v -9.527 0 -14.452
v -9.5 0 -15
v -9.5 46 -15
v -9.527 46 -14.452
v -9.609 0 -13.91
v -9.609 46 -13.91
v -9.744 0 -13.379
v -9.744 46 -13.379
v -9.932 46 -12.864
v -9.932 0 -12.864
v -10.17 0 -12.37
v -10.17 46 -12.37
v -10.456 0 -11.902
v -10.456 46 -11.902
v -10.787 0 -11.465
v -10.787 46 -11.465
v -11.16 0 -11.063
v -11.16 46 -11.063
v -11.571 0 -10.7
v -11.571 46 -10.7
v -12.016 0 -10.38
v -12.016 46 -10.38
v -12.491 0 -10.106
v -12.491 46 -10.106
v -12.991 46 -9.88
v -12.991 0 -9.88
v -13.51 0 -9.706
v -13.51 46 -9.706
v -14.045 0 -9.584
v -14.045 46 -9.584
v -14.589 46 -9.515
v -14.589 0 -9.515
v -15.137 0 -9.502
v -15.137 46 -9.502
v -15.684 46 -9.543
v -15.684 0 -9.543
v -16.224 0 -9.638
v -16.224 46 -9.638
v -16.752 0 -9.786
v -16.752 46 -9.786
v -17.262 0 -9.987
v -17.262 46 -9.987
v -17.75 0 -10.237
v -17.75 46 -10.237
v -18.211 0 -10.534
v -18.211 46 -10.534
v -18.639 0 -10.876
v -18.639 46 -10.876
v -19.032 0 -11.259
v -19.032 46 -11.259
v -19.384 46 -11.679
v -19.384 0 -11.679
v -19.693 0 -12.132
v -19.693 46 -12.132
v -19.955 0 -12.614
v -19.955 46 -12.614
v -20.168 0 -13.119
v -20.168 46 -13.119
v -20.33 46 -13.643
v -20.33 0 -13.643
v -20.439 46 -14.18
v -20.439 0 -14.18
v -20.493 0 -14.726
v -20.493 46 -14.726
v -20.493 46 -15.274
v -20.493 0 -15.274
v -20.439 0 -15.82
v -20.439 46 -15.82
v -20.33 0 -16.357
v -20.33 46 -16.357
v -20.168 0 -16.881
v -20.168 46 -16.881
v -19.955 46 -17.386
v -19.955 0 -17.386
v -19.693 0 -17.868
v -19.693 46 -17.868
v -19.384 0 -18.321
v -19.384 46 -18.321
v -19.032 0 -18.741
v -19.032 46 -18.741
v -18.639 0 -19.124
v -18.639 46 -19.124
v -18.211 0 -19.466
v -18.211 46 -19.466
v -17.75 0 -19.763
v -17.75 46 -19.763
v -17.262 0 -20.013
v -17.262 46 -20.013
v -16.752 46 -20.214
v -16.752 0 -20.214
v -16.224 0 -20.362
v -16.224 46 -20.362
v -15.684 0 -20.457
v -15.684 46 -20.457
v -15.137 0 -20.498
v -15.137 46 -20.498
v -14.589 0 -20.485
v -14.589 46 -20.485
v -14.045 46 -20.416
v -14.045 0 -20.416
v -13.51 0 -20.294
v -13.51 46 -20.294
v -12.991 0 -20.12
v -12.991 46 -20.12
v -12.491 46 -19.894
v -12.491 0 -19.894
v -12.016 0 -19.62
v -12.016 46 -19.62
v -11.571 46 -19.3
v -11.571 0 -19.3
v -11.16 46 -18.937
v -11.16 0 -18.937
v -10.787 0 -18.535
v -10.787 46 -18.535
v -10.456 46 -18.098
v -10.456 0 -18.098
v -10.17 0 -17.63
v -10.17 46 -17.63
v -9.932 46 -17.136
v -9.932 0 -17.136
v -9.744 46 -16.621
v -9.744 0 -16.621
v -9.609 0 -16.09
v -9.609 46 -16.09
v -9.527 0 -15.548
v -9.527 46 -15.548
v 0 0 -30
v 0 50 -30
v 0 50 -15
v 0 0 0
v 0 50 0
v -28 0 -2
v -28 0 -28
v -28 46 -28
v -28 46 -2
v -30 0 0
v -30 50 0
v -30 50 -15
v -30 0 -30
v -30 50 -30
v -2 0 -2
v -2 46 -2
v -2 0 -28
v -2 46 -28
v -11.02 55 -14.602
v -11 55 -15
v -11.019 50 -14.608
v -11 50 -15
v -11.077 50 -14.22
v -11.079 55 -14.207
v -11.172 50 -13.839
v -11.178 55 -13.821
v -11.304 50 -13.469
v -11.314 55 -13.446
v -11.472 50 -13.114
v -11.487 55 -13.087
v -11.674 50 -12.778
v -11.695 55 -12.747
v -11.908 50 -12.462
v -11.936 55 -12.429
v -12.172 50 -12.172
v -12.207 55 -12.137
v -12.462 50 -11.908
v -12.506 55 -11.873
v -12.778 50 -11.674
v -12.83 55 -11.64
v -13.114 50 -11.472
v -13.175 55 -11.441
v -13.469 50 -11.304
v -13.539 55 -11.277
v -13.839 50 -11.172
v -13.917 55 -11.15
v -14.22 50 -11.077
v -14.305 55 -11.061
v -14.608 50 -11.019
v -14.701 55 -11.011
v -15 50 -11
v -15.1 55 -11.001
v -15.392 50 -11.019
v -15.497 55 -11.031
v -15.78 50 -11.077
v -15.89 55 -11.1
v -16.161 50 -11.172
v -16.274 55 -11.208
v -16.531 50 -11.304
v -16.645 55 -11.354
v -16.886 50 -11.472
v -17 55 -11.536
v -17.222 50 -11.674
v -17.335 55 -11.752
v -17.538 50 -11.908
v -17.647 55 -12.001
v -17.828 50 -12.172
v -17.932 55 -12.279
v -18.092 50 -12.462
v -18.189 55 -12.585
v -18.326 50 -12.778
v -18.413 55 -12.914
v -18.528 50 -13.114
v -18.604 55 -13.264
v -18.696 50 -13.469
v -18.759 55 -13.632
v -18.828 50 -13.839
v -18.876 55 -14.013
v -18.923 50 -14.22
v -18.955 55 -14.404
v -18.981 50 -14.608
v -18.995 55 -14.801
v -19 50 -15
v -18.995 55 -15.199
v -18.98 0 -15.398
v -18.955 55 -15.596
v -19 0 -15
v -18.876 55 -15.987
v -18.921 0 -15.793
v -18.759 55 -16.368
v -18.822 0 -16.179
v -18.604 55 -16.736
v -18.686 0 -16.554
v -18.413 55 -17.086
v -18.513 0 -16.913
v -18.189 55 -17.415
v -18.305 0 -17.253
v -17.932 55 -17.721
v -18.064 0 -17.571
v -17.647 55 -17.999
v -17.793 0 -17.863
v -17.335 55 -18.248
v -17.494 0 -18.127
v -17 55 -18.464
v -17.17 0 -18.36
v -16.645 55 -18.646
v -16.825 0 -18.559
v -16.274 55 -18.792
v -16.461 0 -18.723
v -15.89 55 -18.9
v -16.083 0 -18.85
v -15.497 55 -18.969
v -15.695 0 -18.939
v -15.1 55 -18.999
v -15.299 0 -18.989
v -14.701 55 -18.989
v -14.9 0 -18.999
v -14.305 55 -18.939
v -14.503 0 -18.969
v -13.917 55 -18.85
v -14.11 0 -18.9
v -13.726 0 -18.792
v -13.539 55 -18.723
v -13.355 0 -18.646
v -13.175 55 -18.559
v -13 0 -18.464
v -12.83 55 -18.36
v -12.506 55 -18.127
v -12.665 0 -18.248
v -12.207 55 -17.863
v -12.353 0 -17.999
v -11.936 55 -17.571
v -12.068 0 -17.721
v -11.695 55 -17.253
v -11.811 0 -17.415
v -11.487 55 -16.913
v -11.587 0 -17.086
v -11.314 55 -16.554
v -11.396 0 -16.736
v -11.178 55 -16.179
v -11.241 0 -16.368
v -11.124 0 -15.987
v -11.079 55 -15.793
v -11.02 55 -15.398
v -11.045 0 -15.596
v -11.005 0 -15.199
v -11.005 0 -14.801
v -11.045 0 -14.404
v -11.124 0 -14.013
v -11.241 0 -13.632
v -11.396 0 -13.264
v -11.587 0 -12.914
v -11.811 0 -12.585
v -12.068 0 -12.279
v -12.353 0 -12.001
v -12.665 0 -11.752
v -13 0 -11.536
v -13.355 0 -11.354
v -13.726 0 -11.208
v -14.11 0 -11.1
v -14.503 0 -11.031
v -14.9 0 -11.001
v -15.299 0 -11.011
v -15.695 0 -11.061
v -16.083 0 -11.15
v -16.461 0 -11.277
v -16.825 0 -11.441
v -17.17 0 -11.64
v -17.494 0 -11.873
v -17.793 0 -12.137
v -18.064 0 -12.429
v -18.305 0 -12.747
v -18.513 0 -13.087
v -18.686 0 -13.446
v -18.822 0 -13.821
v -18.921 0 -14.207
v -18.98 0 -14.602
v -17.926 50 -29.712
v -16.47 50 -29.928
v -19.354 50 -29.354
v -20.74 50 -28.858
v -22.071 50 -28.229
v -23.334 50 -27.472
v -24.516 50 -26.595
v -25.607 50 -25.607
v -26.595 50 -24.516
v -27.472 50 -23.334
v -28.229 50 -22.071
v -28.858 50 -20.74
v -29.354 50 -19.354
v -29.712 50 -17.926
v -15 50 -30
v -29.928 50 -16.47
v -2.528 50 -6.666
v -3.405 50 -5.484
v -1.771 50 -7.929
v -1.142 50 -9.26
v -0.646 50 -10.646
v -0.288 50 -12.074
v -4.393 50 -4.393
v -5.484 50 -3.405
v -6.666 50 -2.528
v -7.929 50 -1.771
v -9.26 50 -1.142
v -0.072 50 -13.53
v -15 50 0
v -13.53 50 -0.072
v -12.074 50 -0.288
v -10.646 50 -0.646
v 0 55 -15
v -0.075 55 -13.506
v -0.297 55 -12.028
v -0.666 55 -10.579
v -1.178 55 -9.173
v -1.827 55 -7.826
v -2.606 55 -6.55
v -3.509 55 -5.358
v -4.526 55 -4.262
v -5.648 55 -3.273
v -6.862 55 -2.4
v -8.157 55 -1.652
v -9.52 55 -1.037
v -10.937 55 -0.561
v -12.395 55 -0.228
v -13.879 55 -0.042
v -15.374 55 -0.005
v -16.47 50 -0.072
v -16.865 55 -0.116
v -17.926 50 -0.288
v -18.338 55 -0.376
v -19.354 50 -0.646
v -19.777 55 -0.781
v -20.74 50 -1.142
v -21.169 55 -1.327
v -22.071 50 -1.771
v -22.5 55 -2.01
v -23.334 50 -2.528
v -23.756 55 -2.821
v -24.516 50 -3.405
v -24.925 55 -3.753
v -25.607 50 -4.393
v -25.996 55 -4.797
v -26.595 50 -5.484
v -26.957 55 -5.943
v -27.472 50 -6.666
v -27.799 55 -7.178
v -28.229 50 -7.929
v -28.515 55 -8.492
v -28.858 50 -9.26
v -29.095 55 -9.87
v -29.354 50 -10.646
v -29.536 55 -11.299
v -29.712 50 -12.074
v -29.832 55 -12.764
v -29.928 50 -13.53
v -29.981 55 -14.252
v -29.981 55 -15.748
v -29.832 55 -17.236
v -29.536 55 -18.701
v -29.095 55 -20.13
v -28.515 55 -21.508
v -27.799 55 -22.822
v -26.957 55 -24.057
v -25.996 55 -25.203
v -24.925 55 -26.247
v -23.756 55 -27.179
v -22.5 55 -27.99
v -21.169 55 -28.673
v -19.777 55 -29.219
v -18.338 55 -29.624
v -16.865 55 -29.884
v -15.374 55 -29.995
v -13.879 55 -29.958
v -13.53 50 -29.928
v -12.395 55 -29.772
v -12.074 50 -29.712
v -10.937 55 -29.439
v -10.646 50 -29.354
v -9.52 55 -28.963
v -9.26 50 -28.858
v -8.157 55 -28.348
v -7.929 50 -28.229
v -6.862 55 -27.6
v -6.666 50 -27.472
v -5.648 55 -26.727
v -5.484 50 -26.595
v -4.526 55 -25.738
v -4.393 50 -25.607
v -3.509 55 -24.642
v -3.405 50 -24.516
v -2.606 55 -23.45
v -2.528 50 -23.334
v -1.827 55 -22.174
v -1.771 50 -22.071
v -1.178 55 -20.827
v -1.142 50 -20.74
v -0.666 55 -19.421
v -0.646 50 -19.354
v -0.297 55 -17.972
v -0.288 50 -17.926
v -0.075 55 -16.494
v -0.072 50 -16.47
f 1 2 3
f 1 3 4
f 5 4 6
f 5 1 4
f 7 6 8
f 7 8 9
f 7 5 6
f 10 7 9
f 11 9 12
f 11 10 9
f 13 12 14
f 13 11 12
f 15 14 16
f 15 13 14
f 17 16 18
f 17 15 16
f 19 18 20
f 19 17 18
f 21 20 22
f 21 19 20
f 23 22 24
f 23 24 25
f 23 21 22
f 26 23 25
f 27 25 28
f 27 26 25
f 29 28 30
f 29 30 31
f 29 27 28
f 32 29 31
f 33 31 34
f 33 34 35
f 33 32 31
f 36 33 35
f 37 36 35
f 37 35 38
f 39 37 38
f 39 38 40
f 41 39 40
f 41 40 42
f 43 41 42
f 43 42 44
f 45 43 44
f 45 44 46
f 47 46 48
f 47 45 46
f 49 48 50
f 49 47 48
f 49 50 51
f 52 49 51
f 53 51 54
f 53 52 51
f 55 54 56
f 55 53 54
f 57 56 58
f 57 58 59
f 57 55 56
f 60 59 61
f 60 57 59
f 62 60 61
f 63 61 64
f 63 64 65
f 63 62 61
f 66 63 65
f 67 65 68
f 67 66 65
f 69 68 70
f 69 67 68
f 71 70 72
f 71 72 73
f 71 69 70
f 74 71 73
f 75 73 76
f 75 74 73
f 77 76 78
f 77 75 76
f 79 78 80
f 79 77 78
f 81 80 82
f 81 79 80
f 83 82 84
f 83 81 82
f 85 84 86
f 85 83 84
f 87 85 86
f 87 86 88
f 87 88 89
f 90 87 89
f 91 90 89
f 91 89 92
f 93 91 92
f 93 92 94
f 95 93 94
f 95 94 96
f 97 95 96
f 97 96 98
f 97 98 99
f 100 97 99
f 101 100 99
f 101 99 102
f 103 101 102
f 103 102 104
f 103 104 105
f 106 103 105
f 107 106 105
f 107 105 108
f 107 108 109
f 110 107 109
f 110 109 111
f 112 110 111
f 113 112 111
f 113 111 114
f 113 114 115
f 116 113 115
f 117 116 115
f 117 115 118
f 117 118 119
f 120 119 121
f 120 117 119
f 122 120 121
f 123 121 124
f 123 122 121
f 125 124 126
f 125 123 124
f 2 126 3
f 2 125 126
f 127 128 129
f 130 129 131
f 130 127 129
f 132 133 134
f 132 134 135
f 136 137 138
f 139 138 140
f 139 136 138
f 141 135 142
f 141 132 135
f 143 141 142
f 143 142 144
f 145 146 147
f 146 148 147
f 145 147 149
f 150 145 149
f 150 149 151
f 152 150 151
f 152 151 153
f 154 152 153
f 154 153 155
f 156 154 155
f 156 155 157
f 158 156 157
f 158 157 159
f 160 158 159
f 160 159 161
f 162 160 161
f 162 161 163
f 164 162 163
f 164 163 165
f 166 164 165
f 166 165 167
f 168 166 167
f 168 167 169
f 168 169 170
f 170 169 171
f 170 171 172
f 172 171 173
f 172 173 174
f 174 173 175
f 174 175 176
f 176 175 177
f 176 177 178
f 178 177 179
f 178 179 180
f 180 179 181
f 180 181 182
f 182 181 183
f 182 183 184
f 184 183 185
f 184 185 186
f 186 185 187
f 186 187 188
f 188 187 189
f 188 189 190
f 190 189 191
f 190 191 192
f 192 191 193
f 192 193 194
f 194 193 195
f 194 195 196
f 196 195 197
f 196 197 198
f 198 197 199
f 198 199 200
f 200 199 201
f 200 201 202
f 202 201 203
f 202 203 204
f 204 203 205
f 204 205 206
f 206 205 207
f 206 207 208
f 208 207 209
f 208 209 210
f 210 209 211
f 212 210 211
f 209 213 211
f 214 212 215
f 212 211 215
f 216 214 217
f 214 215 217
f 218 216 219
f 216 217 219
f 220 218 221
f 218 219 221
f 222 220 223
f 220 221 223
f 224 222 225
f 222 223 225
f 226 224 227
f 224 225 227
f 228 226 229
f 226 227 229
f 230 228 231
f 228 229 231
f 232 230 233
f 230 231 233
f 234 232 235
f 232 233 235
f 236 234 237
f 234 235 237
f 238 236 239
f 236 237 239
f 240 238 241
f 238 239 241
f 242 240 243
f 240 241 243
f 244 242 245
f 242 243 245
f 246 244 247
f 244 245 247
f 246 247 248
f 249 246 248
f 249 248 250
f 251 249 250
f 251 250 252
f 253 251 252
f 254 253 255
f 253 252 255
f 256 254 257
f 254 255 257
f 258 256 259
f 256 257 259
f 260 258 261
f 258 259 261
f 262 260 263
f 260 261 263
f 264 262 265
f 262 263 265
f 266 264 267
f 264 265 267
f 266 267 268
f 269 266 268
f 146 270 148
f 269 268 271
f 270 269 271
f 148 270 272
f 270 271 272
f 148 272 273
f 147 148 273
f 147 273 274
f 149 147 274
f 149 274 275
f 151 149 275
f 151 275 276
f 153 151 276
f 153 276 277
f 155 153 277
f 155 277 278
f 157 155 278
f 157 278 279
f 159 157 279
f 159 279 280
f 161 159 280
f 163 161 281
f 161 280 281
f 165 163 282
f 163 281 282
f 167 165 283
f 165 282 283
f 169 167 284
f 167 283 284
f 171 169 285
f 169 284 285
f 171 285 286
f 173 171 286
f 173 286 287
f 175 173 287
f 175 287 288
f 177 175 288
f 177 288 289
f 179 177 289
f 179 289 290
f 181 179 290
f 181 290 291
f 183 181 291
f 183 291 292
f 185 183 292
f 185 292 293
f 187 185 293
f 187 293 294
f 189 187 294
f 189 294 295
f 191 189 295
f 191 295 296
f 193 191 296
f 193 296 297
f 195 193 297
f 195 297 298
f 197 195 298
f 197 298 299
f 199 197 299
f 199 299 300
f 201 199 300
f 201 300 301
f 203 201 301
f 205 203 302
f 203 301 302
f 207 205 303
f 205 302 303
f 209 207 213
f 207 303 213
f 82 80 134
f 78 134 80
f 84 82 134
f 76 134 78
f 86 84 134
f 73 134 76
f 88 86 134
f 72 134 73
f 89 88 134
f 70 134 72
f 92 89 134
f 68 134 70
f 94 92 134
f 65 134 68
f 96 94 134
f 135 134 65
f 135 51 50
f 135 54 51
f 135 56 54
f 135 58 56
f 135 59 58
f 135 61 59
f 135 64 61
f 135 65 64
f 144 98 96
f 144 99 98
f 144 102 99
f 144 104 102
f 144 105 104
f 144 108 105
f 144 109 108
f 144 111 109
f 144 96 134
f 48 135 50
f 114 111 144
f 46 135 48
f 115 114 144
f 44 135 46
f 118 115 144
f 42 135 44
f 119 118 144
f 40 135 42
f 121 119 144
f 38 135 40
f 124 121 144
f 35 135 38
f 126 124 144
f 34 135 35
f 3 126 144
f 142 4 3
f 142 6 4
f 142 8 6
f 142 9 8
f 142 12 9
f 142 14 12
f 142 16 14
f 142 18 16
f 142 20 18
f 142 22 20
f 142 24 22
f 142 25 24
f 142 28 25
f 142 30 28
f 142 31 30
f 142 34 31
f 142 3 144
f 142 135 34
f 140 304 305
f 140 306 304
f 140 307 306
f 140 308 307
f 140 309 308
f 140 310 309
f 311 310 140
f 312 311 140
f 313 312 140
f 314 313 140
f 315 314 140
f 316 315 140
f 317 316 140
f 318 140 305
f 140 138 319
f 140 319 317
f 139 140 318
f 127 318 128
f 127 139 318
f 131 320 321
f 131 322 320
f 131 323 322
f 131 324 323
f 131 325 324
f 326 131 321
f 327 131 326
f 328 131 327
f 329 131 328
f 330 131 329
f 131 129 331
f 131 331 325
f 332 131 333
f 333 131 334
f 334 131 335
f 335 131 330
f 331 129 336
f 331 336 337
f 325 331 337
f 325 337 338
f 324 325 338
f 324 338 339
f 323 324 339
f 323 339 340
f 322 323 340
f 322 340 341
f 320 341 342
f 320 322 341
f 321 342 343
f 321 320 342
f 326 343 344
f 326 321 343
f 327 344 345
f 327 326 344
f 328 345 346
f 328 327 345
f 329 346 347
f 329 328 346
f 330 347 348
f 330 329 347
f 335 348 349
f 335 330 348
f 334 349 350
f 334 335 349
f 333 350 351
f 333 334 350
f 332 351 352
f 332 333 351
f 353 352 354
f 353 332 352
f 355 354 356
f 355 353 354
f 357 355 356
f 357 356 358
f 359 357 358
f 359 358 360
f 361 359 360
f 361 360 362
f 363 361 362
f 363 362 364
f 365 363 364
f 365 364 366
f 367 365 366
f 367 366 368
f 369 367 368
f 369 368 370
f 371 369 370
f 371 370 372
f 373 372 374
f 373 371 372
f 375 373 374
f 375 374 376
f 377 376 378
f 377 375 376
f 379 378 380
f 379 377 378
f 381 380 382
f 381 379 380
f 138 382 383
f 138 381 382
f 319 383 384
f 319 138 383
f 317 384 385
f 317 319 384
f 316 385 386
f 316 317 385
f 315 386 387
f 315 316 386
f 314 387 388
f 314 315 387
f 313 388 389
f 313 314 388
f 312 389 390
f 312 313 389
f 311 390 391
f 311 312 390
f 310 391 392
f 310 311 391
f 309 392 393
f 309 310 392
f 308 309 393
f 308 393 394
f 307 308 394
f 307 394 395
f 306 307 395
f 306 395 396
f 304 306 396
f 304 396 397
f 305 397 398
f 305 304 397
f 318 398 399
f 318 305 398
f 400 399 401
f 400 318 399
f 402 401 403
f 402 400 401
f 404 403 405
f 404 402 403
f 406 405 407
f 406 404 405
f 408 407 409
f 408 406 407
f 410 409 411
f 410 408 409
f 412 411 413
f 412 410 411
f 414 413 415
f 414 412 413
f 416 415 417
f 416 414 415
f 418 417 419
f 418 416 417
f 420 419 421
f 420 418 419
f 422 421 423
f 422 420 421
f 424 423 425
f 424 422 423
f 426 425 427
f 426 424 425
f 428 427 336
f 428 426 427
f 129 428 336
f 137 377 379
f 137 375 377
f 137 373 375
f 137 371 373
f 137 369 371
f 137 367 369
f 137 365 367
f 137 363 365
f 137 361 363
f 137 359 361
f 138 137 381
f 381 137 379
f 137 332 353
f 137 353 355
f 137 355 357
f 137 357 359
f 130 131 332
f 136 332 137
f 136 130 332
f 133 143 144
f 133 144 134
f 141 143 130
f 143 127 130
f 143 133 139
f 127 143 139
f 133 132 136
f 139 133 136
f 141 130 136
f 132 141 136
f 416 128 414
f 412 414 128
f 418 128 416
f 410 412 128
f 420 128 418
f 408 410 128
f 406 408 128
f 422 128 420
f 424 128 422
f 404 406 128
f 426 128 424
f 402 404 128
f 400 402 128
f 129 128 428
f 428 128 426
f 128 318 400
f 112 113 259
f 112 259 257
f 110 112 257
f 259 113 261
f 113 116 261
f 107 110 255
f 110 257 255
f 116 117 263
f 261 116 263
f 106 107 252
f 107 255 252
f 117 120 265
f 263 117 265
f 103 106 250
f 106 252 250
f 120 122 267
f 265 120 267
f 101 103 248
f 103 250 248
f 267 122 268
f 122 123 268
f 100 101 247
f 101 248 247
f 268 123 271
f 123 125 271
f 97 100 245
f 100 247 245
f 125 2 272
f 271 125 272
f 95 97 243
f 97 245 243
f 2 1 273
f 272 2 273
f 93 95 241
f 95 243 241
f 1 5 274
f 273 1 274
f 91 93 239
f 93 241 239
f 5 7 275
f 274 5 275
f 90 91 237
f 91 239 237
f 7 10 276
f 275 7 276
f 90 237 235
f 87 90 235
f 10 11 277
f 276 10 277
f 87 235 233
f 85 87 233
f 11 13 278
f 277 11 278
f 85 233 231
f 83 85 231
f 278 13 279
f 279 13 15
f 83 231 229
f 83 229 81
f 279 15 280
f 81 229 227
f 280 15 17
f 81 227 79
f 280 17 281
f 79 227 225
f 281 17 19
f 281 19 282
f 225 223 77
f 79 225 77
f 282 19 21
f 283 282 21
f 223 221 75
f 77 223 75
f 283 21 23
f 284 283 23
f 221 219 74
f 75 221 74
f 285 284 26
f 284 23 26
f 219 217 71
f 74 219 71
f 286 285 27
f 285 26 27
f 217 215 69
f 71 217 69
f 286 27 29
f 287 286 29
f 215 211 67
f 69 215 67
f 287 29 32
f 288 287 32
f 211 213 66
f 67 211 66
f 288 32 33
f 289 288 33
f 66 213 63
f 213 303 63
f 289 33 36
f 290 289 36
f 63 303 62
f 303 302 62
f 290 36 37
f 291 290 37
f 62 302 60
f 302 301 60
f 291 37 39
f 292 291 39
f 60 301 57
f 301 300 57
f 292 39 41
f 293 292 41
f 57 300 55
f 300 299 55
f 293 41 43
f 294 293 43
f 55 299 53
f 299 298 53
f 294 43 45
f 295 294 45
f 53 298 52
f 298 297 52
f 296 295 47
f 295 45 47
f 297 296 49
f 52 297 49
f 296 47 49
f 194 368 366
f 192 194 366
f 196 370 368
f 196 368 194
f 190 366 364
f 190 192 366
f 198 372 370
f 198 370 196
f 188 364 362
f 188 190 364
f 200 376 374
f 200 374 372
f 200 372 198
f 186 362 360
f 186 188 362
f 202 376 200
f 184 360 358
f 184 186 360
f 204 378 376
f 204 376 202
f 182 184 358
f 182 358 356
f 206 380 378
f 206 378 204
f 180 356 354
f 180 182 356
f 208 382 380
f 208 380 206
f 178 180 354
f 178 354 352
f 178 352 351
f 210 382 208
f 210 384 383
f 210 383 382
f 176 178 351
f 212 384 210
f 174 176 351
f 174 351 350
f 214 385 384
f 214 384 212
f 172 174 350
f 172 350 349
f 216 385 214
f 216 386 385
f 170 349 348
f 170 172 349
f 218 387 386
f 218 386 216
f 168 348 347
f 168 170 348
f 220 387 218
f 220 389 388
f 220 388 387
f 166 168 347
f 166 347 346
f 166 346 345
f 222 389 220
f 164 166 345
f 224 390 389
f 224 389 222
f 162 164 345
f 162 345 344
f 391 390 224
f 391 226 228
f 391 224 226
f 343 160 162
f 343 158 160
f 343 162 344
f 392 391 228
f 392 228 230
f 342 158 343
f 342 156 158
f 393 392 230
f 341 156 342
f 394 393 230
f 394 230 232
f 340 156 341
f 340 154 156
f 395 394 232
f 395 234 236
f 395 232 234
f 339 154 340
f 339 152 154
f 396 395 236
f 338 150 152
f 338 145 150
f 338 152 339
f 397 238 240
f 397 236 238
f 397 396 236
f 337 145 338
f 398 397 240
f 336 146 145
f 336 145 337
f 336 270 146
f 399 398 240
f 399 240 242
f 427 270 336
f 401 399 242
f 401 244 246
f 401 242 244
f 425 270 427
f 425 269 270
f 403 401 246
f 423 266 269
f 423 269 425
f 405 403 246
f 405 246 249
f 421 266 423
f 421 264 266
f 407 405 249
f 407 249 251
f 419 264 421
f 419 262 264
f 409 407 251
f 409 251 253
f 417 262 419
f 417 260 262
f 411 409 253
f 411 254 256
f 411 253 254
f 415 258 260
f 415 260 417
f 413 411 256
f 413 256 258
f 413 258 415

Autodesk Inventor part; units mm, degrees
ref_plane "YZ Plane" through (0, 0, 0) normal (1, 0, 0) x (0, 1, 0)
ref_plane "XZ Plane" through (0, 0, 0) normal (0, 1, 0) x (-1, 0, 0)
ref_plane "XY Plane" through (0, 0, 0) normal (0, 0, 1) x (1, 0, 0)
sketch "Boceto1" plane through (0, 0, 0) normal (0, 1, 0) x (-1, 0, 0)
  line L0 (0, 0) -> (30, 0)
  line L1 (30, 0) -> (30, -30)
  line L2 (30, -30) -> (0, -30)
  line L3 (0, -30) -> (0, 0)
  circle A0 centre (15, -15) radius 4
  dimension "d0" = 30
  dimension "d1" = 30
  dimension "d2" = 8
extrude "Extrusión1" add sketch "Boceto1" along normal blind 50
sketch "Boceto2" plane through (0, 50, 0) normal (0, 1, 0) x (1, 0, 0)
  circle A0 centre (-15, 15) radius 4 projected
  circle A1 centre (-15, 15) radius 15
  point P0 (0, 0)
  dimension "d5" = 30
extrude "Extrusión2" add sketch "Boceto2" along normal blind 5
sketch "Boceto3" plane through (0, 0, 0) normal (0, -1, 0) x (1, 0, 0)
  circle A0 centre (-15, -15) radius 4 projected
  circle A1 centre (-15, -15) radius 5.5
  line L0 (-2, -28) -> (-28, -28)
  line L1 (-28, -28) -> (-28, -2)
  line L2 (-28, -2) -> (-2, -2)
  line L3 (-2, -2) -> (-2, -28)
  line L4 (-2, -28) -> (-28, -2) construction
  line L5 (-28, -28) -> (-2, -2) construction
  point P0 (0, 0)
  dimension "d8" = 11
  dimension "d9" = 26
  dimension "d10" = 26
extrude "Extrusión3" cut sketch "Boceto3" against normal blind 46 contours L0 L1 L2 L3
properties part number "Troncox1"
